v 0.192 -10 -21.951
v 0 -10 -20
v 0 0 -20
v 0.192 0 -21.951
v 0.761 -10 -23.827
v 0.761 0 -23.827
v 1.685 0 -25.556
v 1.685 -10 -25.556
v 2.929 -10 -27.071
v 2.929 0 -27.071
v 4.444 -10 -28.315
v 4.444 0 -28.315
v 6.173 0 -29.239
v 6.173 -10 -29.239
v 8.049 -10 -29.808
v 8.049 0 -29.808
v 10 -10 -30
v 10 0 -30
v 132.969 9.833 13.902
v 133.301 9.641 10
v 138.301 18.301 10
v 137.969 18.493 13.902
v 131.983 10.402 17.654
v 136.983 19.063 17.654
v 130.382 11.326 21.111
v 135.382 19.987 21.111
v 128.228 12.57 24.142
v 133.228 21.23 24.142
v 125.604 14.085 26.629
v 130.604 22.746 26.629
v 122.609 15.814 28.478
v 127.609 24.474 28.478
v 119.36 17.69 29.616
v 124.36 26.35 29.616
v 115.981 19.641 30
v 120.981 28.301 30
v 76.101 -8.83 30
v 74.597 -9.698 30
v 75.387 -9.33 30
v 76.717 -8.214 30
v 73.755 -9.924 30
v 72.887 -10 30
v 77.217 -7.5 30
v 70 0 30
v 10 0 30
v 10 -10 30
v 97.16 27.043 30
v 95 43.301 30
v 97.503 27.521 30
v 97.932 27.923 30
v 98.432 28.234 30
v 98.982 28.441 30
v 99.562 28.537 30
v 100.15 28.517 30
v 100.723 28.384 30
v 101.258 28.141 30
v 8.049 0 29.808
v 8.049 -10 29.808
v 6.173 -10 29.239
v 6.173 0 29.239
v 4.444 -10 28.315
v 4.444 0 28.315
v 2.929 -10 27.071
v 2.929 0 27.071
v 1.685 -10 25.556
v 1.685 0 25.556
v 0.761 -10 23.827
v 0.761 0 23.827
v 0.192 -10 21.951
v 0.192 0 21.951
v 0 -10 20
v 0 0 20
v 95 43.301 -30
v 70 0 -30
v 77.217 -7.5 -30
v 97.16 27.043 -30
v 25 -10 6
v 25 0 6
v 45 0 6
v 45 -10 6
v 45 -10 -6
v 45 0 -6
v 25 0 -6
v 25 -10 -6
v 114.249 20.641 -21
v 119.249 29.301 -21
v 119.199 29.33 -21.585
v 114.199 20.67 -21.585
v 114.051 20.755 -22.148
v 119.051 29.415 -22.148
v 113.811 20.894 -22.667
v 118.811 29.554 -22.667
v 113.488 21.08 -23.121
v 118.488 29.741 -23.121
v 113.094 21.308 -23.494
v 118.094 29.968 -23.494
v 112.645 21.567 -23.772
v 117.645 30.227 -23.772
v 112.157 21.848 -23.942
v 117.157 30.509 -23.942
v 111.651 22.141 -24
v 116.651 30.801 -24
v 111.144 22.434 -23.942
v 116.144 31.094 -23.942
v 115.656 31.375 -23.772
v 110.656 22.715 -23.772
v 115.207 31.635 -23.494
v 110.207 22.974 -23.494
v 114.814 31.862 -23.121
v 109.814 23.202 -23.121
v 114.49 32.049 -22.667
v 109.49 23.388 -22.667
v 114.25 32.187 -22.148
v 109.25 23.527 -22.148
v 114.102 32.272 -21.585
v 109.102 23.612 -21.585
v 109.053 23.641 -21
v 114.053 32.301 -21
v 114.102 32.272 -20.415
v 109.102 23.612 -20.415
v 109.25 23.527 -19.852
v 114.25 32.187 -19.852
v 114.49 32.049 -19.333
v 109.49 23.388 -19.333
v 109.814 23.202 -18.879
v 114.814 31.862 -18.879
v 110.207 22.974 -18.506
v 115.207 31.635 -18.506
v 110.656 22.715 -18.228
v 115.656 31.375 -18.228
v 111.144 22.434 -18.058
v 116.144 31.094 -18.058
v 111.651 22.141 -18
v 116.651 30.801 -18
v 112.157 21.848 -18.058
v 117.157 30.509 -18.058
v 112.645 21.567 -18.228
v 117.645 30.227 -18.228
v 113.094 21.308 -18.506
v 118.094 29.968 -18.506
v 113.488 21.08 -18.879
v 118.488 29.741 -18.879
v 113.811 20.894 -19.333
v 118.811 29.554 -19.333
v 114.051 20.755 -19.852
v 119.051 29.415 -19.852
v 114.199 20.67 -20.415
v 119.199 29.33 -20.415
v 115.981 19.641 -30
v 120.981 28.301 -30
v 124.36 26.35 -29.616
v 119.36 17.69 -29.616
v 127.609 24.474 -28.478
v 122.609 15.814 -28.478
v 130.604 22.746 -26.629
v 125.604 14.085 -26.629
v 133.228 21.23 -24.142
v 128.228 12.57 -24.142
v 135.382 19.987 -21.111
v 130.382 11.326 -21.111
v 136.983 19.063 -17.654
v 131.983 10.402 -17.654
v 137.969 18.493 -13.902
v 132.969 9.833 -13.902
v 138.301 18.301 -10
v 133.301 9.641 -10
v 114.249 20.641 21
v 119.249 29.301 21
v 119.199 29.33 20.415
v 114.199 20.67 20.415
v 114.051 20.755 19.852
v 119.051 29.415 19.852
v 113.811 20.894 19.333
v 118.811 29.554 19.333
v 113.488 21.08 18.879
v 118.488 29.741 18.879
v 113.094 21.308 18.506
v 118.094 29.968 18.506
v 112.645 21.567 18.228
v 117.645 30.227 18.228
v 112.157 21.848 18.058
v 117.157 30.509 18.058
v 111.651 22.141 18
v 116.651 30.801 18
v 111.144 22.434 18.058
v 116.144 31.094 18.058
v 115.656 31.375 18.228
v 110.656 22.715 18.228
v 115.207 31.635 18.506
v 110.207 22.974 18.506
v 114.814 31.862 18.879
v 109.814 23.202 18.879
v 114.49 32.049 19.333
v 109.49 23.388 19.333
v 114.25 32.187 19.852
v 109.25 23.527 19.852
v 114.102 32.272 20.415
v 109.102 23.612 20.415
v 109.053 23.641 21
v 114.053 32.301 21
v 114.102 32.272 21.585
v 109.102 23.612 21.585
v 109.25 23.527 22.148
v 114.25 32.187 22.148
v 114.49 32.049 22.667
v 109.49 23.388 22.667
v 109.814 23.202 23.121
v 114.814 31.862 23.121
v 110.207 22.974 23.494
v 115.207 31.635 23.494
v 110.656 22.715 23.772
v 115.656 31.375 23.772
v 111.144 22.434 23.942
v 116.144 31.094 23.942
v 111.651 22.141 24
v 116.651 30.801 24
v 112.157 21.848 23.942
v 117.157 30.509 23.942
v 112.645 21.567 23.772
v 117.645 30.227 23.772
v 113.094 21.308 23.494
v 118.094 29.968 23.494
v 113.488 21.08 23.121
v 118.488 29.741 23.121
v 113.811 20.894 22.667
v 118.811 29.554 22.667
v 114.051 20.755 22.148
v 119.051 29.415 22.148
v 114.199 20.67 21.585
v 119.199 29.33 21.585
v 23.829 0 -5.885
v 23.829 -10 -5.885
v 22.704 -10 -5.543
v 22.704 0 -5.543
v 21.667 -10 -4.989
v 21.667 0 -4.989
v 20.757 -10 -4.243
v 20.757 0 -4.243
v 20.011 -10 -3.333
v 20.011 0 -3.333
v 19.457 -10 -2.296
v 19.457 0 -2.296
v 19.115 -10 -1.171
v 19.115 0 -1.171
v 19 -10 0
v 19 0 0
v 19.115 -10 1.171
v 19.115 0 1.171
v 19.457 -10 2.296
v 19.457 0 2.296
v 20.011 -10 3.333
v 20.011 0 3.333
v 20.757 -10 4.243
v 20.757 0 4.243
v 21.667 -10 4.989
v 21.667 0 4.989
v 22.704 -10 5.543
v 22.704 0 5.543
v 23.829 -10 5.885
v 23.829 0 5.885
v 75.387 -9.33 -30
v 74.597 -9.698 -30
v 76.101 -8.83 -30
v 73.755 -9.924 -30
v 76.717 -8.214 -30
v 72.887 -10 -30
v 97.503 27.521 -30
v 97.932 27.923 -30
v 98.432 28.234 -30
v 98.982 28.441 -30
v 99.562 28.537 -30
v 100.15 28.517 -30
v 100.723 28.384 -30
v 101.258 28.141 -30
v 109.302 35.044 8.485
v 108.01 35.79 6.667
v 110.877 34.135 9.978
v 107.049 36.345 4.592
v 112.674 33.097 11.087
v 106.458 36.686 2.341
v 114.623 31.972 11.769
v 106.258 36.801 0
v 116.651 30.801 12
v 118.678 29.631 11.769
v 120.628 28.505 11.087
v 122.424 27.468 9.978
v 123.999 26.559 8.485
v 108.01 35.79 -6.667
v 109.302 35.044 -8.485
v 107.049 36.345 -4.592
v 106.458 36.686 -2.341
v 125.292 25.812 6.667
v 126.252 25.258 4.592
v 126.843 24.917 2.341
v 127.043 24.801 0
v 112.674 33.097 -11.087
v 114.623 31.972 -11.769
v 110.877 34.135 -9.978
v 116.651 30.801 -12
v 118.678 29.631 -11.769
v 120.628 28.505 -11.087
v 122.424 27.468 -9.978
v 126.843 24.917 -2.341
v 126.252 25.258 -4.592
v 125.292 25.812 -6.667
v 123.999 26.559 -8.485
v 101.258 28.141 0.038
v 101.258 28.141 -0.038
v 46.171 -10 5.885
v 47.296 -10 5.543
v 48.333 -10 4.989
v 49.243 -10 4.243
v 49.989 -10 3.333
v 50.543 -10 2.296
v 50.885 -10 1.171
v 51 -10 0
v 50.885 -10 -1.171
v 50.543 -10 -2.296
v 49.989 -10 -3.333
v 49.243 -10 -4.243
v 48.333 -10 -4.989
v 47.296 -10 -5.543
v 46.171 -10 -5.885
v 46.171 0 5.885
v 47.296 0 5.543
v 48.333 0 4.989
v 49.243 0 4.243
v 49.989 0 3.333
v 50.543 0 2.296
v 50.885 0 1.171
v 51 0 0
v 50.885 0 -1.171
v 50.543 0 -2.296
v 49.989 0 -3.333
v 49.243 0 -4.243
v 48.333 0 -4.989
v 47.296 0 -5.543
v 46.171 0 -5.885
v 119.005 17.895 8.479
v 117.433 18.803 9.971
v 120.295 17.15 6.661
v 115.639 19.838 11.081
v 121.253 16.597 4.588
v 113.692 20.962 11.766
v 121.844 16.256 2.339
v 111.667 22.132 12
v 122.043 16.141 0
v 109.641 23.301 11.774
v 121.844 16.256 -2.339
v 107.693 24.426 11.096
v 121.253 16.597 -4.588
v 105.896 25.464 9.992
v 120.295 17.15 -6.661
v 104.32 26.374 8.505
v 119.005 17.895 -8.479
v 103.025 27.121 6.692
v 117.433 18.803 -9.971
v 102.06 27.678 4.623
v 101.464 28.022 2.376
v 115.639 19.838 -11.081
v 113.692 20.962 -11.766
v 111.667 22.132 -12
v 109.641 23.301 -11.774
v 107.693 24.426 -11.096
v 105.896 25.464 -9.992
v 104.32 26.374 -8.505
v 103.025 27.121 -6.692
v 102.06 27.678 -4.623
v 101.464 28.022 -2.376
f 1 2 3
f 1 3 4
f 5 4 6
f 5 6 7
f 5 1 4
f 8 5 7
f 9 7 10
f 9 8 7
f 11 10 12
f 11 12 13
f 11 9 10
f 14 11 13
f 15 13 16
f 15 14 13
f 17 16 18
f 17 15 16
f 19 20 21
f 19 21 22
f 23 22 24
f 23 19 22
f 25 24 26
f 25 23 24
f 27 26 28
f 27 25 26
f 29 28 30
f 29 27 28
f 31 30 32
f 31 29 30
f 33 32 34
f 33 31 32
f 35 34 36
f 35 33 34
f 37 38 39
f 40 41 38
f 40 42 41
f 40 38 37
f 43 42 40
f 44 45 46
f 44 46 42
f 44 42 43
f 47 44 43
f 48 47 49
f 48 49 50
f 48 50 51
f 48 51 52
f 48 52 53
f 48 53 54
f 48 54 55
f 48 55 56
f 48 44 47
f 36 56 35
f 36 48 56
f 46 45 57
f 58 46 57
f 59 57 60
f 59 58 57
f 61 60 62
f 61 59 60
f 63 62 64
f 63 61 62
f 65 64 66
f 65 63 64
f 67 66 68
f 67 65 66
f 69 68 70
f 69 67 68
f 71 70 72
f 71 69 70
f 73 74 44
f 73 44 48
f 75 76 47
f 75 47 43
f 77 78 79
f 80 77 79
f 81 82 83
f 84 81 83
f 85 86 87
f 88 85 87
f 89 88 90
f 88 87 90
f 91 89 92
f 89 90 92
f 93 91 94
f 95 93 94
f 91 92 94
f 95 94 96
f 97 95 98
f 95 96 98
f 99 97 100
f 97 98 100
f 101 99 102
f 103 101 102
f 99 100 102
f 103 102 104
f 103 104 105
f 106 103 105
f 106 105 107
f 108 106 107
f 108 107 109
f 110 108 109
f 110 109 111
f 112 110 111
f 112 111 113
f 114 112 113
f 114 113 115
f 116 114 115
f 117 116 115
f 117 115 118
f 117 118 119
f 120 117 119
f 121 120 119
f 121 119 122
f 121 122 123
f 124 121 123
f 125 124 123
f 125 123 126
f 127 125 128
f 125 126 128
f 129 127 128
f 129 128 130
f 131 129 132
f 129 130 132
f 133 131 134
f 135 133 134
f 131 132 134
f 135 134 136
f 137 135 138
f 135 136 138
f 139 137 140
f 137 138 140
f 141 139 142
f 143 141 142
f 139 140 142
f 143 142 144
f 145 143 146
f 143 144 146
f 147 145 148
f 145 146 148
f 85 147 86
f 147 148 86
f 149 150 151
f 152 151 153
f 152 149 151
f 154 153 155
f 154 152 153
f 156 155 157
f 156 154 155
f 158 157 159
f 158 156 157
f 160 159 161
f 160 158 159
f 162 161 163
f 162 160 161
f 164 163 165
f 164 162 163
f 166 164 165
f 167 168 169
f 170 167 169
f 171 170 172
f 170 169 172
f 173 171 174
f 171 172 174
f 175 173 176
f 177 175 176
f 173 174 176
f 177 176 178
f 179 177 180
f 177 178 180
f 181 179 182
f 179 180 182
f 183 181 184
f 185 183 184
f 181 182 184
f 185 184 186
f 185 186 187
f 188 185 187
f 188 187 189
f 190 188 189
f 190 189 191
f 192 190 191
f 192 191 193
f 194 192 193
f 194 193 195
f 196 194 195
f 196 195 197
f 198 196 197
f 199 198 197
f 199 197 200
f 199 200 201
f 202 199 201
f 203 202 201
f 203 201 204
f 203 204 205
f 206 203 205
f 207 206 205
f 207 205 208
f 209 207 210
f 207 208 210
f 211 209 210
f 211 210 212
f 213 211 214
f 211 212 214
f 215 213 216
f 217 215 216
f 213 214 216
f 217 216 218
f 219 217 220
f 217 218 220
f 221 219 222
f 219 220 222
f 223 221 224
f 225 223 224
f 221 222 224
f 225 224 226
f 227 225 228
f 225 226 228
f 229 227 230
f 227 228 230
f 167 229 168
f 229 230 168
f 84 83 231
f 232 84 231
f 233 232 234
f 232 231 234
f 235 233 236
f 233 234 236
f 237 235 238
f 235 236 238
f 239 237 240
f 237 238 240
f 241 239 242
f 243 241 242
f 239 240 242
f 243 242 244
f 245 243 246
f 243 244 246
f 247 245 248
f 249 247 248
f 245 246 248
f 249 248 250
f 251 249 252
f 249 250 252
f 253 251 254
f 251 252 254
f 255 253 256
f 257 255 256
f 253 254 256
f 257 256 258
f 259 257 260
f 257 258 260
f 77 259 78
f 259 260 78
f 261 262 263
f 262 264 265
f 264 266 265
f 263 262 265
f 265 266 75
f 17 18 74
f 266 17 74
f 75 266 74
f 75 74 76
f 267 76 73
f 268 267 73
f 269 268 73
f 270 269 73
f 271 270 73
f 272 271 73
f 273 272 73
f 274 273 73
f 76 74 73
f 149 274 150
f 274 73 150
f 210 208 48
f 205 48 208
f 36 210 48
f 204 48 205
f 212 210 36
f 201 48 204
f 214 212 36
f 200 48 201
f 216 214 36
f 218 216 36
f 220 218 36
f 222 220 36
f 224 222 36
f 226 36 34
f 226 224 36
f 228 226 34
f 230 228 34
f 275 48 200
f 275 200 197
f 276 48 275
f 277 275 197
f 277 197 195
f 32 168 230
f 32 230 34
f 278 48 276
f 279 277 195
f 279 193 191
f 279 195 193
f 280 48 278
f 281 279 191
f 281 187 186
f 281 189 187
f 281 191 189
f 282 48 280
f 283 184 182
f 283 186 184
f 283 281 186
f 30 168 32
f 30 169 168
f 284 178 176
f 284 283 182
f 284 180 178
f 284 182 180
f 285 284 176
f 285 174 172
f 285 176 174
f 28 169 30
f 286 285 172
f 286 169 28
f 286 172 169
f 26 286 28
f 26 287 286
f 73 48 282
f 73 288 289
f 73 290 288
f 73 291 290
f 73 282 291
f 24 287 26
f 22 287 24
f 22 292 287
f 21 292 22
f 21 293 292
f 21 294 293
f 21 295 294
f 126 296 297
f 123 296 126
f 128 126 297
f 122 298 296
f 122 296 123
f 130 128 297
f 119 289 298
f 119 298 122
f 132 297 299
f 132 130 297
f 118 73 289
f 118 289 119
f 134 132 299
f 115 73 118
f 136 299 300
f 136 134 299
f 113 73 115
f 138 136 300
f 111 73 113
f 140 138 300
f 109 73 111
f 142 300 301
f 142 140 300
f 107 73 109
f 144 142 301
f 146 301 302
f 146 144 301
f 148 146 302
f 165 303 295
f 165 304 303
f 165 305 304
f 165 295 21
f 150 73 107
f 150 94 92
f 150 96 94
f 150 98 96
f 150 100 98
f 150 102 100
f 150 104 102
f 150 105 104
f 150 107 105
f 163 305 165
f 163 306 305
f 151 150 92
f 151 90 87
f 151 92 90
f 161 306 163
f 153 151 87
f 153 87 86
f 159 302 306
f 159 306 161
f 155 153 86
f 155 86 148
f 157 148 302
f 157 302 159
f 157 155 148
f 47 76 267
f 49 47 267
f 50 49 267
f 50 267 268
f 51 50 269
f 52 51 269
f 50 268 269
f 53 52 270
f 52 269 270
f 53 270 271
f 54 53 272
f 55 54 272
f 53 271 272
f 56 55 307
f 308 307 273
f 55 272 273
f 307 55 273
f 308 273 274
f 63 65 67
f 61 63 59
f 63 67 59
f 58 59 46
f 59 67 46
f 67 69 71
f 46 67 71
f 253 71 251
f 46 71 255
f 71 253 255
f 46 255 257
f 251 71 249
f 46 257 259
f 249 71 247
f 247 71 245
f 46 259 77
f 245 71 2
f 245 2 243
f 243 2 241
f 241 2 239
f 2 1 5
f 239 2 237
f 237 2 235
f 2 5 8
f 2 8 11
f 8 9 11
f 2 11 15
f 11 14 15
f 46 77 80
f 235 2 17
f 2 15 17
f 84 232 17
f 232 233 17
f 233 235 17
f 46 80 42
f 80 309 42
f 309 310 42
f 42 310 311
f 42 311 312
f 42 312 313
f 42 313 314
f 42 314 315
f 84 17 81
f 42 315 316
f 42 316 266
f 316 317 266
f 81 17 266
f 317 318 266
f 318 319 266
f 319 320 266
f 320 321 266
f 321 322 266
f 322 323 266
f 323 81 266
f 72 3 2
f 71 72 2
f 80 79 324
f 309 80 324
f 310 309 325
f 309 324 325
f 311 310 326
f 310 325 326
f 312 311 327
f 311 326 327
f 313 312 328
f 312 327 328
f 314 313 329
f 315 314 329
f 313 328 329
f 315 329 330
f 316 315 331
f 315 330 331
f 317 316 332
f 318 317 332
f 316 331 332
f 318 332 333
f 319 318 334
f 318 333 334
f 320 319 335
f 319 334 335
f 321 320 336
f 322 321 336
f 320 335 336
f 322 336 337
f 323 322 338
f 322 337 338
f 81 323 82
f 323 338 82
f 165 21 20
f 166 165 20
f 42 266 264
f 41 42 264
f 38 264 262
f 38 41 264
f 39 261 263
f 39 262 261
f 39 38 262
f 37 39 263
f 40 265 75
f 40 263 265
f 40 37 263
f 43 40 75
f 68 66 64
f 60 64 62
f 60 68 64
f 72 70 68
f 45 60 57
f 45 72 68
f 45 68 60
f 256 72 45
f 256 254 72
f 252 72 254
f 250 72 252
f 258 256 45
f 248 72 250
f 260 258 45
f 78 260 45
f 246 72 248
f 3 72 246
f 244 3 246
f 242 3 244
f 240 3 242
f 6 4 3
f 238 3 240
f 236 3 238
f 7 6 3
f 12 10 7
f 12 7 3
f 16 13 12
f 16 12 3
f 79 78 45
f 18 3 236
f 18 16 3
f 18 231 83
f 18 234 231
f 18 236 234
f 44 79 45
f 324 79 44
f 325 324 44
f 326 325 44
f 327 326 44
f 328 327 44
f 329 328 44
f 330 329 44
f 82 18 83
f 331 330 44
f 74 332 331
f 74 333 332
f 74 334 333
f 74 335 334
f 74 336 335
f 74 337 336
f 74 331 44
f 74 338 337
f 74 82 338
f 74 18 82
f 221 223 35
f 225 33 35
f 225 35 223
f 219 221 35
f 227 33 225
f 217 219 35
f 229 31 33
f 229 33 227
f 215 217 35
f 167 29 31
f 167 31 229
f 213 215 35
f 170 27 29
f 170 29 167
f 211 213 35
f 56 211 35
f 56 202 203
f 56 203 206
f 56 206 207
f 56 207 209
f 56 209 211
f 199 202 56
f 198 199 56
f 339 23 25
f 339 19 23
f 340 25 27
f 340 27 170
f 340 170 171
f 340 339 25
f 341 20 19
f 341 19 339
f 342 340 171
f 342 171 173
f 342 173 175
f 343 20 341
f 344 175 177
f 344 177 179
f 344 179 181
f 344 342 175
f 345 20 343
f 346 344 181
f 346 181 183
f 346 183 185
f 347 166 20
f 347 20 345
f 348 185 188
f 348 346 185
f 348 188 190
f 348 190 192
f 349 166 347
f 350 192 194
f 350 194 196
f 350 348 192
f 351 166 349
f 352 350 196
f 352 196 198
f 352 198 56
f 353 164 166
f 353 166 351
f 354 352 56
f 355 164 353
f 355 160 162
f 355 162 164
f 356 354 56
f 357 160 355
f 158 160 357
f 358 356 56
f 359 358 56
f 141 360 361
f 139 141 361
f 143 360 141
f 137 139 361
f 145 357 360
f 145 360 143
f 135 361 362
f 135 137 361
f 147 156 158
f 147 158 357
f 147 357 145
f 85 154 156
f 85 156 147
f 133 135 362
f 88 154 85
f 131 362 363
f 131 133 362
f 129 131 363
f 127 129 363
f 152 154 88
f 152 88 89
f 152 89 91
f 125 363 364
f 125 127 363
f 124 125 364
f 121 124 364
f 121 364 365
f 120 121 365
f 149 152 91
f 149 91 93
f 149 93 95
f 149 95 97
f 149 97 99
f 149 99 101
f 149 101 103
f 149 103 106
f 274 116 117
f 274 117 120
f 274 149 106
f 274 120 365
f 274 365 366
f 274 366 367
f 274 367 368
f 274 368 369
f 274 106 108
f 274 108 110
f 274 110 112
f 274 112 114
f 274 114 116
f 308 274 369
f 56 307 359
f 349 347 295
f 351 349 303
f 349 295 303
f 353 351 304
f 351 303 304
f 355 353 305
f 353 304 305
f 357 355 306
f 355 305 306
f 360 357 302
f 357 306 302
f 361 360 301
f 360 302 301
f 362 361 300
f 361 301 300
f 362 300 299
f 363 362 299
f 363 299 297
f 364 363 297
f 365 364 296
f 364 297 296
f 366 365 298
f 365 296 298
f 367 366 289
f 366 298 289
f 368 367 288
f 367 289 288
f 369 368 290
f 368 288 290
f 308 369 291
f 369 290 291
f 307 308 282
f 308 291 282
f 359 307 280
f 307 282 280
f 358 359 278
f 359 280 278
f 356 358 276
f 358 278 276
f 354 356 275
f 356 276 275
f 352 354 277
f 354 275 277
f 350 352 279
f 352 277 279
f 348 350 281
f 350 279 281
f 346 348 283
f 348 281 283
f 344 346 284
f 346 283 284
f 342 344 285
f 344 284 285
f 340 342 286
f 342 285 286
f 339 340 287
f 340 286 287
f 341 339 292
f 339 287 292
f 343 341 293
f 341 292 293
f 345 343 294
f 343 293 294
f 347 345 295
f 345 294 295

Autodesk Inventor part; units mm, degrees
ref_plane "YZ Plane" through (0, 0, 0) normal (1, 0, 0) x (0, 1, 0)
ref_plane "XZ Plane" through (0, 0, 0) normal (0, 1, 0) x (-1, 0, 0)
ref_plane "XY Plane" through (0, 0, 0) normal (0, 0, 1) x (1, 0, 0)
sketch "스케치1" plane through (0, 0, 0) normal (0, 0, 1) x (1, 0, 0)
  line L0 (0, 0) -> (0, -10)
  line L1 (0, -10) -> (75.7735, -10)
  line L2 (0, 0) -> (70, 0)
  line L3 (0, 0) -> (70, 0) construction
  line L4 (70, 0) -> (95, 43.3013)
  line L5 (95, 43.3013) -> (138.3013, 18.3013)
  line L6 (138.3013, 18.3013) -> (133.3013, 9.641)
  line L7 (133.3013, 9.641) -> (98.6603, 29.641)
  line L8 (98.6603, 29.641) -> (75.7735, -10)
  dimension "d0" = 10
  dimension "d10" = 70
  dimension "d12" = 50
  dimension "d13" = 120
  dimension "d14" = 50
  dimension "d15" = 90
  dimension "d16" = 10
  dimension "d17" = 90
  dimension "d18" = 10
extrude "돌출1" add sketch "스케치1" along normal mid plane 60
fillet "모깎기1" radius 10 2 edges at (0, -5, 30) (0, -5, -30)
fillet "모깎기2" radius 20 2 edges at (135.8013, 13.9711, 30) (135.8013, 13.9711, -30)
fillet "모깎기3" radius 5 1 edges at (75.7735, -10, 0)
fillet "모깎기4" radius 3 1 edges at (98.6603, 29.641, 0)
sketch "스케치2" plane through (70, 0, 30) normal (0, 1, 0) x (1, 0, 0)
  line L0 (-45, 30) -> (-25, 30) construction
  line L1 (-45, 24) -> (-25, 24)
  line L2 (-25, 36) -> (-45, 36)
  arc A0 (-45, 36) -> (-45, 24) centre (-45, 30) ccw
  arc A1 (-25, 24) -> (-25, 36) centre (-25, 30) ccw
  line L3 (-70, 10) -> (-70, 50) projected
  line L4 (0, 0) -> (-60, 0) projected
  point P0 (-70, 30)
  point P1 (-35, 30)
  dimension "d23" = 12
  dimension "d24" = 20
  dimension "d25" = 25
  dimension "d26" = 30
extrude "돌출2" cut sketch "스케치2" against normal blind 60
sketch "스케치3" plane through (95, 43.3013, 30) normal (0.5, 0.866, 0) x (0.866, -0.5, 0)
  circle A0 centre (25, 30) radius 12
  circle A1 centre (25, 51) radius 3
  circle A2 centre (25, 9) radius 3
  line L0 (0, 60) -> (0, 0) projected
  line L1 (0, 60) -> (30, 60) projected
  point P0 (-60.6218, 30)
  dimension "d29" = 24
  dimension "d30" = 6
  dimension "d32" = 6
  dimension "d33" = 21
  dimension "d34" = 21
  dimension "d36" = 25
  dimension "d37" = 25
  dimension "d38" = 30
extrude "돌출3" cut sketch "스케치3" against normal blind 60
properties part number "1번"
